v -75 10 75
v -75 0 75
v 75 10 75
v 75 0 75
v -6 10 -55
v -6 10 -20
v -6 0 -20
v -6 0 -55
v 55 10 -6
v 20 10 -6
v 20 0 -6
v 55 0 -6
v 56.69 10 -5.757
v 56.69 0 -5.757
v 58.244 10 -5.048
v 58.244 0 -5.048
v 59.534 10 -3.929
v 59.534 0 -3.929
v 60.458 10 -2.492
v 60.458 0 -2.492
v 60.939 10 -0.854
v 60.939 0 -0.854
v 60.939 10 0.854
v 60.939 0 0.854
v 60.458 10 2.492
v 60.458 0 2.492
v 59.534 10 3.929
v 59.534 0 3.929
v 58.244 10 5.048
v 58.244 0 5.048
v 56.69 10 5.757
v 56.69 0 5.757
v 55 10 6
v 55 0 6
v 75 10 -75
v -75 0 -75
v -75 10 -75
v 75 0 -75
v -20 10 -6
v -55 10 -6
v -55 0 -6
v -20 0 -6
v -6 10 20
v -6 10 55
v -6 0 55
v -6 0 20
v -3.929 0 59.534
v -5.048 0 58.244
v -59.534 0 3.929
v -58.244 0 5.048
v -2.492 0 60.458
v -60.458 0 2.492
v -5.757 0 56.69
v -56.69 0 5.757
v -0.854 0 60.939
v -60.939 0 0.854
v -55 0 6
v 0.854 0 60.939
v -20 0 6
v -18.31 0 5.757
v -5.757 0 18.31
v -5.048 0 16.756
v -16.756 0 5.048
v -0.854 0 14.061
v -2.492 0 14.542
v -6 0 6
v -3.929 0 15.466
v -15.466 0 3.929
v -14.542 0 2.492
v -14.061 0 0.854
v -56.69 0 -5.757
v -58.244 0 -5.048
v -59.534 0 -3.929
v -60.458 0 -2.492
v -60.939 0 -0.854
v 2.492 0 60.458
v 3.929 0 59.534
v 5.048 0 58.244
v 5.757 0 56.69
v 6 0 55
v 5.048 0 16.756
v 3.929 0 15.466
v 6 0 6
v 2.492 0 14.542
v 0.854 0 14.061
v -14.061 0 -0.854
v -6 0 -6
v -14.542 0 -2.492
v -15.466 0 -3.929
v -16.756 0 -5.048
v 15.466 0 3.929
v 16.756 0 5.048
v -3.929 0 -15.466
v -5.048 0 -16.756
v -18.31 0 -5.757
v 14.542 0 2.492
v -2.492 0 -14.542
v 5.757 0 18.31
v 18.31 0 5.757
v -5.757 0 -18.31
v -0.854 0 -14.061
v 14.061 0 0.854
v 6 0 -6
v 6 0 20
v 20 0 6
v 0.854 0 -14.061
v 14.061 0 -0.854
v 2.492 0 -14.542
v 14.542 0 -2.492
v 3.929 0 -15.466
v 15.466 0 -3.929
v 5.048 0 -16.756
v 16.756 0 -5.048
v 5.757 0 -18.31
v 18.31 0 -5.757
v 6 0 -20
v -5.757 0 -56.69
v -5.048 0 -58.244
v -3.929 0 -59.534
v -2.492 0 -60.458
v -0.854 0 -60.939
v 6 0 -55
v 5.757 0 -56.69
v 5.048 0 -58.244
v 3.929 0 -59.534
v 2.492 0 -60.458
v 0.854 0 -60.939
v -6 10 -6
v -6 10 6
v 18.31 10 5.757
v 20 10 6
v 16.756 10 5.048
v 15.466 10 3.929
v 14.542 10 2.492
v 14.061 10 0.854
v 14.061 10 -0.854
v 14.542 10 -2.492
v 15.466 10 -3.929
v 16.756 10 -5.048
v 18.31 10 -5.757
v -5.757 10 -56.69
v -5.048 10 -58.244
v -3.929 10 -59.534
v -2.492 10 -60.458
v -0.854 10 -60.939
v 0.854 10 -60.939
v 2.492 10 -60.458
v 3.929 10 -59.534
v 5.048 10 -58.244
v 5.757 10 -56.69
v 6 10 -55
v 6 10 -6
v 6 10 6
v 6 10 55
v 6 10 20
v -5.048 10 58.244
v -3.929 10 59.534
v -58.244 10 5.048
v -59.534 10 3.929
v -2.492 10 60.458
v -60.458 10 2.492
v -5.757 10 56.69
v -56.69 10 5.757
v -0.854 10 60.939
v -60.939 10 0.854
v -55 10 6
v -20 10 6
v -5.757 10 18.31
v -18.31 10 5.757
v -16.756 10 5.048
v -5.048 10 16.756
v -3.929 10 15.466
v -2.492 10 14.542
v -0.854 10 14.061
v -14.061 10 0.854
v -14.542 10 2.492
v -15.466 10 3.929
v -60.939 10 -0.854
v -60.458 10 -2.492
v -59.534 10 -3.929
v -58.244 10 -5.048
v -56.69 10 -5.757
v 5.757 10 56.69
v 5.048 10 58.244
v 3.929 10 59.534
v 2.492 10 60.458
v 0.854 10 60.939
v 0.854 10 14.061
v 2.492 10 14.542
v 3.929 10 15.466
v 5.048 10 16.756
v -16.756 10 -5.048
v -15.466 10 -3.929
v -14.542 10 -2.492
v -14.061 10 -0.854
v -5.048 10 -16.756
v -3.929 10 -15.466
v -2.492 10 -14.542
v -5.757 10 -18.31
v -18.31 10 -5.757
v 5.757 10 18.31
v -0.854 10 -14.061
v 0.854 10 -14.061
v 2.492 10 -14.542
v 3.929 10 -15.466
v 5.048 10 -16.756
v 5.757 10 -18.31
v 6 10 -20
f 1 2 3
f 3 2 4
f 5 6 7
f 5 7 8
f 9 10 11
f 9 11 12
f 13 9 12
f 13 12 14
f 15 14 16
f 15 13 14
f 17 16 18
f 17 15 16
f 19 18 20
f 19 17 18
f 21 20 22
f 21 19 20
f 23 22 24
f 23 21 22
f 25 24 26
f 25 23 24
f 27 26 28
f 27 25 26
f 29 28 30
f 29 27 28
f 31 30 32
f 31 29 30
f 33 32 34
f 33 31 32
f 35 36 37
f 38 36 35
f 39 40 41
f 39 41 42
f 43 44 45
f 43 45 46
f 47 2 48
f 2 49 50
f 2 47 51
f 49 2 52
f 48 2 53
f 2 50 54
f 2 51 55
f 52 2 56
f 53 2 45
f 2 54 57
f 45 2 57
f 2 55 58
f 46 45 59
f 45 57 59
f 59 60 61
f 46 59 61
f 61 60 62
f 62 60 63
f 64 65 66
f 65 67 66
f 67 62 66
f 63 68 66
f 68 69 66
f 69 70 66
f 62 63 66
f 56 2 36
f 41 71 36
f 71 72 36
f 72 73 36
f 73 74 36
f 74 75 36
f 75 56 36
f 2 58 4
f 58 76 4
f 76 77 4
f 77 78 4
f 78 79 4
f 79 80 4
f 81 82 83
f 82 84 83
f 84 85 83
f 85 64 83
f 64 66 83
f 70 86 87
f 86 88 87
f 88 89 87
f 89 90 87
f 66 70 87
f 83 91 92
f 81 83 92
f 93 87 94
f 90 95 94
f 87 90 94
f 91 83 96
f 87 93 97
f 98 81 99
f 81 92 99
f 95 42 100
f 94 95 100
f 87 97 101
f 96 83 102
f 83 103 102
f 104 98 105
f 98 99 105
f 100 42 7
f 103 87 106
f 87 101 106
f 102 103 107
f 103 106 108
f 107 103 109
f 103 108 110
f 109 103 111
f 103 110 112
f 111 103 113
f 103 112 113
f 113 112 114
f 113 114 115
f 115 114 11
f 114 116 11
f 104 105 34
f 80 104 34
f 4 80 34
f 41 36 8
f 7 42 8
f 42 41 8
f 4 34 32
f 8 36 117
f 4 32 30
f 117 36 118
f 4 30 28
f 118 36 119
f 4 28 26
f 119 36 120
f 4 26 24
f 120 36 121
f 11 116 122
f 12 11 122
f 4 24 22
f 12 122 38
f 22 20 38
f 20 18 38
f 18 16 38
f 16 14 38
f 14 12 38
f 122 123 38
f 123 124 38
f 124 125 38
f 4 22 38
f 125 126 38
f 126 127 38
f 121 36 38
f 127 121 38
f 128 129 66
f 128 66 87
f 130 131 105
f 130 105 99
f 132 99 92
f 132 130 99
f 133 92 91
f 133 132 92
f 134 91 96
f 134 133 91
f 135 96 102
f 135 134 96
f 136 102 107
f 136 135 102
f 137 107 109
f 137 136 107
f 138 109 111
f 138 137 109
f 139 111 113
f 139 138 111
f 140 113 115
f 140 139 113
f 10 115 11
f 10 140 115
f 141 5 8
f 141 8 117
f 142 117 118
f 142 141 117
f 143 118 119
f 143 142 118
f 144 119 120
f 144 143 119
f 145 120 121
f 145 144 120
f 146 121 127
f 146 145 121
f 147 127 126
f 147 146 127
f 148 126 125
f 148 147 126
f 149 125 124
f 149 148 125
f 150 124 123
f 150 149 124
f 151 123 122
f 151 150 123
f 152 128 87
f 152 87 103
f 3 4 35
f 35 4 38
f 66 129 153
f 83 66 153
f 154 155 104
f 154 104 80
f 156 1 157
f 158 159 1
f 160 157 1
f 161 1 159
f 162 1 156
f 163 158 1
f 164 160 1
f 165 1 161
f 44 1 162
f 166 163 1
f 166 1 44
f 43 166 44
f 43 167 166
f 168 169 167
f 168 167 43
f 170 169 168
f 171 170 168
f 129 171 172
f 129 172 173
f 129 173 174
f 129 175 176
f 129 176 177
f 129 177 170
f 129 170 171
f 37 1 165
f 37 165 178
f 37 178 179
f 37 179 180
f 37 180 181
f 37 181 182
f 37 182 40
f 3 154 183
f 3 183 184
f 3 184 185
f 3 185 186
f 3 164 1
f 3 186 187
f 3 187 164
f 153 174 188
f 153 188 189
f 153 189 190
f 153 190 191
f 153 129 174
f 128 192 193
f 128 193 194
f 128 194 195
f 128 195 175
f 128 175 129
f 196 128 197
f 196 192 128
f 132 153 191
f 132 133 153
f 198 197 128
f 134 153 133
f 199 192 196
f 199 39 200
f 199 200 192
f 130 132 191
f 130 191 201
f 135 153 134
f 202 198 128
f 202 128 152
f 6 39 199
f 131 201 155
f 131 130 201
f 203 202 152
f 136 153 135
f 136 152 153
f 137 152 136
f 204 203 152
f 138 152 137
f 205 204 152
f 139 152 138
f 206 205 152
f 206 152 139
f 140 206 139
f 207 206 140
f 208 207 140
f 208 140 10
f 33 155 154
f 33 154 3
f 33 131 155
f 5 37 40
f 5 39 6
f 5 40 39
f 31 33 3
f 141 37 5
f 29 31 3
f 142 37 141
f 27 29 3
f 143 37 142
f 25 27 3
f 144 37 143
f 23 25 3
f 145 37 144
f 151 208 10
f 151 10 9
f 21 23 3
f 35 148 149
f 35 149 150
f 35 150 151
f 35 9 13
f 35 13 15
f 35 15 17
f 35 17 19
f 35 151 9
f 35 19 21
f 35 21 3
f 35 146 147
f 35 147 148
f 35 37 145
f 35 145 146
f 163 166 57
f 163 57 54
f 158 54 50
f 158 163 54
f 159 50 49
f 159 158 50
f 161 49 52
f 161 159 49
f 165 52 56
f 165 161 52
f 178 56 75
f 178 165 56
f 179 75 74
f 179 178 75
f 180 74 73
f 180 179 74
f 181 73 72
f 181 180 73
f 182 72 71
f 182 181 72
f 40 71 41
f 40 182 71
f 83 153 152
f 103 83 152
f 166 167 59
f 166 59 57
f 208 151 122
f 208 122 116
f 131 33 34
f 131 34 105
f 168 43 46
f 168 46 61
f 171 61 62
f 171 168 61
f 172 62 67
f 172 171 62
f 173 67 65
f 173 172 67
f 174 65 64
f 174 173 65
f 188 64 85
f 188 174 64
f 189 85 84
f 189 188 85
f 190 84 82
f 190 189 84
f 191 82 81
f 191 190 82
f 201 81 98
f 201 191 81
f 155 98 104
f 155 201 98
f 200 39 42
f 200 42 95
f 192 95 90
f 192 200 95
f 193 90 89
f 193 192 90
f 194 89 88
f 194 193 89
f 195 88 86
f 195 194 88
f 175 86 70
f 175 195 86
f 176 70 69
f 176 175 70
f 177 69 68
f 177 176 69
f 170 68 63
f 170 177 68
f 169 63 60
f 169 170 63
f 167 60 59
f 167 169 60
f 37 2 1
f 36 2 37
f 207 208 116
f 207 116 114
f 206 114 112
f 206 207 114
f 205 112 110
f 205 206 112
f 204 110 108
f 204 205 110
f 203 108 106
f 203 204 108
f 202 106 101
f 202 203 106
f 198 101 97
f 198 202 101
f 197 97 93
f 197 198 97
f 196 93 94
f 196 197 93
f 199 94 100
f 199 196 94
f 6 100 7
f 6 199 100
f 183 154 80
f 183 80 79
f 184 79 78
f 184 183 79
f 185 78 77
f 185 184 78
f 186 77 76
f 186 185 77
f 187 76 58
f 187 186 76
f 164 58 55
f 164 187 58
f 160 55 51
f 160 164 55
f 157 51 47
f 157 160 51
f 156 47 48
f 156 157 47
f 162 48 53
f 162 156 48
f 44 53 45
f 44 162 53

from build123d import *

# Parameters (mm, degrees)
SKETCH1_W           = 150
SKETCH1_H           = 150
BOSS_EXTRUDE1_DEPTH = 10
SKETCH3_W           = 12
SKETCH3_H           = 12
CUT_EXTRUDE2_DEPTH  = 107.536378763
CUT_EXTRUDE1_DEPTH  = 107.536378763
CIRPATTERN1_COUNT   = 4


with BuildPart() as part:
    # Sketch1 → Boss-Extrude1 (new body)
    with BuildSketch(Plane(origin=(0, 0, 0), x_dir=(1, 0, 0), z_dir=(0, 1, 0))):
        Rectangle(SKETCH1_W, SKETCH1_H)
    extrude(amount=BOSS_EXTRUDE1_DEPTH)

    # Sketch3 → Cut-Extrude2 (cut, through all)
    with BuildSketch(Plane(origin=(0, 10, 0), x_dir=(1, 0, 0), z_dir=(0, 1, 0))):
        Rectangle(SKETCH3_W, SKETCH3_H)
    extrude(amount=-CUT_EXTRUDE2_DEPTH, mode=Mode.SUBTRACT)

    # Sketch2 → Cut-Extrude1 (cut, through all)
    with BuildSketch(Plane(origin=(0, 10, 0), x_dir=(1, 0, 0), z_dir=(0, 1, 0))):
        with BuildLine():
            Line((20, 6), (55, 6))
            ThreePointArc((55, 6), (61, 0), (55, -6))
            Line((55, -6), (20, -6))
            ThreePointArc((20, -6), (14, 0), (20, 6))
        make_face()
    cut_extrude1 = extrude(amount=-CUT_EXTRUDE1_DEPTH, mode=Mode.SUBTRACT)

    # CirPattern1: Cut-Extrude1 ×4 about axis
    cirpattern1_axis = Axis((0, -0.5, 0), (0, 1, 0))
    for i in range(1, CIRPATTERN1_COUNT):
        add(cut_extrude1.rotate(cirpattern1_axis, i * 360 / CIRPATTERN1_COUNT), mode=Mode.SUBTRACT)


solid = part.part
